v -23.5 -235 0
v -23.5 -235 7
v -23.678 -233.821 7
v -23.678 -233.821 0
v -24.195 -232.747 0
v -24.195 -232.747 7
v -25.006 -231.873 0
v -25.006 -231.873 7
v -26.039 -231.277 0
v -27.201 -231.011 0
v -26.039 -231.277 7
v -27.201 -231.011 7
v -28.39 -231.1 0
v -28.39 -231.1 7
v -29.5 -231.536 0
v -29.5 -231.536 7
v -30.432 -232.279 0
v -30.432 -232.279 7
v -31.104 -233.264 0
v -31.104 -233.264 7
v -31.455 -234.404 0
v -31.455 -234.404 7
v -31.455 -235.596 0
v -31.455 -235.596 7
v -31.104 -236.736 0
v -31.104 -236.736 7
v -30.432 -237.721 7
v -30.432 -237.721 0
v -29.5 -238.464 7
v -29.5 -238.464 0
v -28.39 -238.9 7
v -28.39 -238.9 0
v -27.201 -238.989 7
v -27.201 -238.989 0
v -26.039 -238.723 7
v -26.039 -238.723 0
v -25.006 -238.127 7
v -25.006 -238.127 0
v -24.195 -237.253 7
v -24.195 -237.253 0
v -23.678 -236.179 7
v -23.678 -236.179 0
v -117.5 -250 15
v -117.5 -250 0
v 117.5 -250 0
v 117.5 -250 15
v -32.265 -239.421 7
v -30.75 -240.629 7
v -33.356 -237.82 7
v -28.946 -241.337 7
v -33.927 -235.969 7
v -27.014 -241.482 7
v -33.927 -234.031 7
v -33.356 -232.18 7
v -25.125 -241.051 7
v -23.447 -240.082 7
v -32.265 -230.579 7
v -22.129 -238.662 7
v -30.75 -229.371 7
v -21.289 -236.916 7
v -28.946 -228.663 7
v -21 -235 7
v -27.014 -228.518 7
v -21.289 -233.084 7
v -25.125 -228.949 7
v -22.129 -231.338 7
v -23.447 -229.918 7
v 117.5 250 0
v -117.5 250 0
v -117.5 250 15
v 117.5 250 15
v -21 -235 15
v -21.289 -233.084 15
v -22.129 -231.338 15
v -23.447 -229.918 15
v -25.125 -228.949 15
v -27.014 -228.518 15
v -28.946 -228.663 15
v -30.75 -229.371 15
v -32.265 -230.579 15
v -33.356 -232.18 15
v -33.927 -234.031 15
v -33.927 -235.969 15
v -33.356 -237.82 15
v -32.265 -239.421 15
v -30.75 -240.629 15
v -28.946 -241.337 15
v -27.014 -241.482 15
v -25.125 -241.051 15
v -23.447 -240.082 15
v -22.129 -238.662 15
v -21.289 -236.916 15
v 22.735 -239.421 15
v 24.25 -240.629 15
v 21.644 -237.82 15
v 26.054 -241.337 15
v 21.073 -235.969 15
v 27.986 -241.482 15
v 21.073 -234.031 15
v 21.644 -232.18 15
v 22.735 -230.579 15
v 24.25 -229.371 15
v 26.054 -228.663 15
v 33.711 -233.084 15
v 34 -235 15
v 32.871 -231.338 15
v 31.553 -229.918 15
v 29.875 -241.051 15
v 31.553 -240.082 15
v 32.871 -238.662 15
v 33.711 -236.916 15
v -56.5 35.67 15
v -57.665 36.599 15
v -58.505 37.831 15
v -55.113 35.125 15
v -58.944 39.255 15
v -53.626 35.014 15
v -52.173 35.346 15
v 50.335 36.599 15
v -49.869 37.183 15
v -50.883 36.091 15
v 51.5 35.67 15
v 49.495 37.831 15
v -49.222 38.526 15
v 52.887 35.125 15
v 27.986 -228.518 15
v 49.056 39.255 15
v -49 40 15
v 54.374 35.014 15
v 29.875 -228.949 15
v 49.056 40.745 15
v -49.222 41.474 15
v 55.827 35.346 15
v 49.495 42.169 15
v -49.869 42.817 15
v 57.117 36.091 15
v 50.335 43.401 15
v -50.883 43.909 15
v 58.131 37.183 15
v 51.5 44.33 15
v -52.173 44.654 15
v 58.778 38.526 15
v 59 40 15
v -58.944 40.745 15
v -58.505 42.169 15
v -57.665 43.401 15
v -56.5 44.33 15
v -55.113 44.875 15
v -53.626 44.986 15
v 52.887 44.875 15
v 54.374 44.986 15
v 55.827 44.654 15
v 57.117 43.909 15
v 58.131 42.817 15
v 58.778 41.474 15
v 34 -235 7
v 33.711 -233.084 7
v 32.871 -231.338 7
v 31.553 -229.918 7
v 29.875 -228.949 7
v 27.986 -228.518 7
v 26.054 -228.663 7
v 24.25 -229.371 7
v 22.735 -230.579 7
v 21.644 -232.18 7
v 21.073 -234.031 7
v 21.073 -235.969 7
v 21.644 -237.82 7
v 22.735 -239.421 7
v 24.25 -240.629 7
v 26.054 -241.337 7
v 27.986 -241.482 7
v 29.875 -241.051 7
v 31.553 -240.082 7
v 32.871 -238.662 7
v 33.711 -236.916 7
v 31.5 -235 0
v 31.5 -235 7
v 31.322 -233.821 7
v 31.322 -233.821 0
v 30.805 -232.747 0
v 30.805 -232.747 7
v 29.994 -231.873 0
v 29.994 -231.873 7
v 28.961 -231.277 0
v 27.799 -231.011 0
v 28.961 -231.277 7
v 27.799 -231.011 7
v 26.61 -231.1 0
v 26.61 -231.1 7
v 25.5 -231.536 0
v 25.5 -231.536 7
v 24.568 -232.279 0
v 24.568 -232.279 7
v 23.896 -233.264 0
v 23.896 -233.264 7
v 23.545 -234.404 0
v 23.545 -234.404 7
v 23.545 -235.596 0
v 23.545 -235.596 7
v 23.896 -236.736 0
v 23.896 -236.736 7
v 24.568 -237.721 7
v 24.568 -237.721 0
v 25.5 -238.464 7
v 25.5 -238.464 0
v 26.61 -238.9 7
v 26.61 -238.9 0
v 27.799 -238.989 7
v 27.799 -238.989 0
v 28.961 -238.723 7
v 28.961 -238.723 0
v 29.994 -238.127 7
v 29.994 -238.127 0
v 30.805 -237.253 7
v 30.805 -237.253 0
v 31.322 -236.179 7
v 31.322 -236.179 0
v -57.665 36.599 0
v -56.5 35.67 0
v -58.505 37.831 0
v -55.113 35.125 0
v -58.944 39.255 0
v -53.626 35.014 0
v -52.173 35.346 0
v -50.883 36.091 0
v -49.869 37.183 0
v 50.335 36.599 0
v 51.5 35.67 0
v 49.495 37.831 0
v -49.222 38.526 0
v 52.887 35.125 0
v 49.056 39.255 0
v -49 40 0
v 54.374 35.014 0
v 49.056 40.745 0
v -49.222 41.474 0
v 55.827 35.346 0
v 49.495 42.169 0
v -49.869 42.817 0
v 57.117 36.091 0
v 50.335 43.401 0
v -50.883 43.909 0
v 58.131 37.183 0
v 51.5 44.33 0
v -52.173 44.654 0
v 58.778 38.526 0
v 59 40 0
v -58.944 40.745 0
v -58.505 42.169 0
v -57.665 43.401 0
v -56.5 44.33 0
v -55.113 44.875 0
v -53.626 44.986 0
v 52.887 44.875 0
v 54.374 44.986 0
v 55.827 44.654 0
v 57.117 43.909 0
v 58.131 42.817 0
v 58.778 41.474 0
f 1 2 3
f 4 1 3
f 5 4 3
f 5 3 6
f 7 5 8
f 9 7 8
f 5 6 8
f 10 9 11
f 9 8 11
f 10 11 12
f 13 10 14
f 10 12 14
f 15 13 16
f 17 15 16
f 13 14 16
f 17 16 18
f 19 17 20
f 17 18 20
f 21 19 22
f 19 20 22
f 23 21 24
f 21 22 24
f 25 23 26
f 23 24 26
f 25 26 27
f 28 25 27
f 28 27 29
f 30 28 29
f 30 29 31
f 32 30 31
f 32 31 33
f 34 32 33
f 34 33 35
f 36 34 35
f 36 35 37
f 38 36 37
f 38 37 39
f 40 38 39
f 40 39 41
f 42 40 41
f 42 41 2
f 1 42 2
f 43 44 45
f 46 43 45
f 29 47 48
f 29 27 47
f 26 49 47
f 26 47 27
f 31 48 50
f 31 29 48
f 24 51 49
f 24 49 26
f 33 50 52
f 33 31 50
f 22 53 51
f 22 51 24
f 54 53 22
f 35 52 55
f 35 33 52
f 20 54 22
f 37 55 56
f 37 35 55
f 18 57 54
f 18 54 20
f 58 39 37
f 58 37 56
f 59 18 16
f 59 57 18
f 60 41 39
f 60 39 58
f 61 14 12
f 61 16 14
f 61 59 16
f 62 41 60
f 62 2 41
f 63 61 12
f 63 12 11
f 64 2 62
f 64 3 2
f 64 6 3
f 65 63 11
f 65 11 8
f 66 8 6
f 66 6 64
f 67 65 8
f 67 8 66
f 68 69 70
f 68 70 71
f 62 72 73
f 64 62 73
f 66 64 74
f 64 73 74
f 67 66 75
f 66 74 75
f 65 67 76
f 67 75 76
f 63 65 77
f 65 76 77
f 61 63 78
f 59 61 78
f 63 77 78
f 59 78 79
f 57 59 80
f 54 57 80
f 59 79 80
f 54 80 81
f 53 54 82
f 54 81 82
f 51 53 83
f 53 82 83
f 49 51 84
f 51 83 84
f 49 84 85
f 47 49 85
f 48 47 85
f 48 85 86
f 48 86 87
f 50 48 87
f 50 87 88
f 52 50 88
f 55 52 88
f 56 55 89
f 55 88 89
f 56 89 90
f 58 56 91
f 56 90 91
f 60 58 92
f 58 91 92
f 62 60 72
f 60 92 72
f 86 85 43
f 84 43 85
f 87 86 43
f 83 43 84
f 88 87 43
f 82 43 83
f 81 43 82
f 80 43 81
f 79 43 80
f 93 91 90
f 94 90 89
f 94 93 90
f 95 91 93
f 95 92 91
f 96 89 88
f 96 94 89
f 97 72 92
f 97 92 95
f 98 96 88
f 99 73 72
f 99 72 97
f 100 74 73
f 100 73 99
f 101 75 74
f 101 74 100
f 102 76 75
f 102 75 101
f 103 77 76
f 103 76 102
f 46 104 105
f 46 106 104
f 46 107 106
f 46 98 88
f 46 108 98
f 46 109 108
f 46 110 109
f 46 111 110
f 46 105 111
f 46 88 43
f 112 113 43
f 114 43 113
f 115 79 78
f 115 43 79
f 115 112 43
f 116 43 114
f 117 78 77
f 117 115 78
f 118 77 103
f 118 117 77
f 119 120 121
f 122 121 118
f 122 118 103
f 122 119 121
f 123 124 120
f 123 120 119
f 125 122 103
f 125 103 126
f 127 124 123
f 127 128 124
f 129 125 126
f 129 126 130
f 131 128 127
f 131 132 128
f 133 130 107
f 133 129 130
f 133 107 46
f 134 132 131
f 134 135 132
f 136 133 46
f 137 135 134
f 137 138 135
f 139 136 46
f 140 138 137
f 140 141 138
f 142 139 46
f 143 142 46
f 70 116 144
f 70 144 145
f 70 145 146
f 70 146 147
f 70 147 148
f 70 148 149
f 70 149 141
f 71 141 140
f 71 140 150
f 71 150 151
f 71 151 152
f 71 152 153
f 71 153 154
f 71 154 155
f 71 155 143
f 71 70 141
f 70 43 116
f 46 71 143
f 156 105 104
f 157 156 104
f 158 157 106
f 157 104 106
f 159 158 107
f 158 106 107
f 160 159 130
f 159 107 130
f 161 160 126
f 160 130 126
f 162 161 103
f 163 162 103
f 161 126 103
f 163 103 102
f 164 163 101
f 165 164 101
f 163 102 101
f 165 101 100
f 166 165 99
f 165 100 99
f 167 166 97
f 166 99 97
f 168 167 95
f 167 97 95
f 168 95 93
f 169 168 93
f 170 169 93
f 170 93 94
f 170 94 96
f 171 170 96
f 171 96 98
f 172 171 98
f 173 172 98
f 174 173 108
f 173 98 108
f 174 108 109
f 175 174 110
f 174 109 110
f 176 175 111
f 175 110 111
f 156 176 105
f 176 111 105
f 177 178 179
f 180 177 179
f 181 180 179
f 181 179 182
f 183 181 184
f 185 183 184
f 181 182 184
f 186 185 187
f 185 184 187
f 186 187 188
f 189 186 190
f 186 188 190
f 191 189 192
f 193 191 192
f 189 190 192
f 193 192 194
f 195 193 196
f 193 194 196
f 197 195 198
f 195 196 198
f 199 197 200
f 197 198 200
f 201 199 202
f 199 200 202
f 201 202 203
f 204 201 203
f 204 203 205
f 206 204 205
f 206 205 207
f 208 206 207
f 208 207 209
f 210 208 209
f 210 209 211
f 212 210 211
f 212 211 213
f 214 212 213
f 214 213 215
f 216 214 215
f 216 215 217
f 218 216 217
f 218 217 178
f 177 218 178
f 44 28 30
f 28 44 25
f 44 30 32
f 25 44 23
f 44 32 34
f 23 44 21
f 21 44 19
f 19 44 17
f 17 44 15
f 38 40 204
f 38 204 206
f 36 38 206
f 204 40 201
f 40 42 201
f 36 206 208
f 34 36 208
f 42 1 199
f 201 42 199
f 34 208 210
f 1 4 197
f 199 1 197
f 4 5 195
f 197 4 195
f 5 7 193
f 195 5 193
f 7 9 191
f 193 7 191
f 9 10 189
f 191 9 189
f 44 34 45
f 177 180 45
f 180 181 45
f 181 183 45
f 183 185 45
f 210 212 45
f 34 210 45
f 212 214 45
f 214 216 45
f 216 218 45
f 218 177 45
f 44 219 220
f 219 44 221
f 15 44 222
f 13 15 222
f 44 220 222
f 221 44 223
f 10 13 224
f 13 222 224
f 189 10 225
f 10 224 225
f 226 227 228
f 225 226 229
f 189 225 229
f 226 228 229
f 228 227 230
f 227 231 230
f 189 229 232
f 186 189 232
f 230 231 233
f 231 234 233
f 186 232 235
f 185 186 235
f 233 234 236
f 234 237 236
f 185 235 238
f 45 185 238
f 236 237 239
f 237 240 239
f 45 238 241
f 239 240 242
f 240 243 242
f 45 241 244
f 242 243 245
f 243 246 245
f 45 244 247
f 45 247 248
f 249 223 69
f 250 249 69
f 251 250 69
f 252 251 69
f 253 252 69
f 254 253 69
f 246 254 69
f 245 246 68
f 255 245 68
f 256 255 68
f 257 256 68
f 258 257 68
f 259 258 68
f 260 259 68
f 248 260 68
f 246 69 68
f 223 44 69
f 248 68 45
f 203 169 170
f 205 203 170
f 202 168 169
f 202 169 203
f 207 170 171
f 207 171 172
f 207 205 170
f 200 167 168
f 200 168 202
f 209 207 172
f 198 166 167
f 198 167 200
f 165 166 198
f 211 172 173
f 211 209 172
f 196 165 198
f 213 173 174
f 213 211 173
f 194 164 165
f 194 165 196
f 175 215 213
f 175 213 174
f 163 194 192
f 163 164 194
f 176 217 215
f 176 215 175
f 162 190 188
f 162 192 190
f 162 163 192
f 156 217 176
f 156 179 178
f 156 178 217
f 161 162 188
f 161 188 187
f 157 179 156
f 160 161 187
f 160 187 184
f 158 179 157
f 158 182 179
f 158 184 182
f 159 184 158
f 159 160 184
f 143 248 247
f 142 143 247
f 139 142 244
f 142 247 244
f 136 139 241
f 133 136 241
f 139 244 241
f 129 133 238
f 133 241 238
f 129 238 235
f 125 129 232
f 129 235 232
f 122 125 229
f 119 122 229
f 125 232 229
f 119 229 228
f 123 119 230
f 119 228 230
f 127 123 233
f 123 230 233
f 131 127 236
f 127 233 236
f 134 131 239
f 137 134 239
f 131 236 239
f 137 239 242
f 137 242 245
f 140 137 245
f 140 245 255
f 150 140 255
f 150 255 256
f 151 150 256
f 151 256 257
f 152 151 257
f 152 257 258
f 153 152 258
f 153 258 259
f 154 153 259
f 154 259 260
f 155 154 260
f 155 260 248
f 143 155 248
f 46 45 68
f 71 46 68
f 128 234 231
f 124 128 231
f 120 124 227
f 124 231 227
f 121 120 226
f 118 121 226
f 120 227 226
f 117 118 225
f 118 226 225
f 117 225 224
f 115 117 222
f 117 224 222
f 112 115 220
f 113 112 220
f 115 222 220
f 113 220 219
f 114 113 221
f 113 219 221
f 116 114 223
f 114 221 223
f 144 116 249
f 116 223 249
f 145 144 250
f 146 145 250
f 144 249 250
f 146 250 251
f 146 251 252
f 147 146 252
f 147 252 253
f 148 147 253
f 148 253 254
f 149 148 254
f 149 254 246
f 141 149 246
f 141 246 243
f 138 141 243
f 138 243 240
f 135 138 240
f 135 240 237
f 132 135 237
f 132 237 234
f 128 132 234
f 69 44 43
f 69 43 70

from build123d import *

# Parameters (mm, degrees)
F0_W     = 235
F0_H     = 500
F1_DEPTH = 15
F2_R     = 4
F3_DEPTH = 25
F4_R     = 6.5
F5_DEPTH = 8
F6_R     = 5
F7_DEPTH = 15.001


with BuildPart() as f1:
    # F0 (on Top) → F1 (new body)
    with BuildSketch(Plane.XY):
        Rectangle(F0_W, F0_H)
    extrude(amount=F1_DEPTH)

    # F2 (on face) → F3 (cut)
    with BuildSketch(Plane.XY.offset(15)):
        with Locations((27.5, -235)):
            Circle(F2_R)
        with Locations((-27.5, -235)):
            Circle(F2_R)
    extrude(amount=-F3_DEPTH, mode=Mode.SUBTRACT)

    # F4 (on face) → F5 (cut)
    with BuildSketch(Plane.XY.offset(15)):
        with Locations((27.5, -235)):
            Circle(F4_R)
        with Locations((-27.5, -235)):
            Circle(F4_R)
    extrude(amount=-F5_DEPTH, mode=Mode.SUBTRACT)

    # F6 (on face) → F7 (cut, through all)
    with BuildSketch(Plane(origin=(0, 0, 0), x_dir=(1, 0, 0), z_dir=(0, 0, -1))):
        with Locations((54, -40)):
            Circle(F6_R)
        with Locations((-54, -40)):
            Circle(F6_R)
    extrude(amount=-F7_DEPTH, mode=Mode.SUBTRACT)


solid = f1.part
